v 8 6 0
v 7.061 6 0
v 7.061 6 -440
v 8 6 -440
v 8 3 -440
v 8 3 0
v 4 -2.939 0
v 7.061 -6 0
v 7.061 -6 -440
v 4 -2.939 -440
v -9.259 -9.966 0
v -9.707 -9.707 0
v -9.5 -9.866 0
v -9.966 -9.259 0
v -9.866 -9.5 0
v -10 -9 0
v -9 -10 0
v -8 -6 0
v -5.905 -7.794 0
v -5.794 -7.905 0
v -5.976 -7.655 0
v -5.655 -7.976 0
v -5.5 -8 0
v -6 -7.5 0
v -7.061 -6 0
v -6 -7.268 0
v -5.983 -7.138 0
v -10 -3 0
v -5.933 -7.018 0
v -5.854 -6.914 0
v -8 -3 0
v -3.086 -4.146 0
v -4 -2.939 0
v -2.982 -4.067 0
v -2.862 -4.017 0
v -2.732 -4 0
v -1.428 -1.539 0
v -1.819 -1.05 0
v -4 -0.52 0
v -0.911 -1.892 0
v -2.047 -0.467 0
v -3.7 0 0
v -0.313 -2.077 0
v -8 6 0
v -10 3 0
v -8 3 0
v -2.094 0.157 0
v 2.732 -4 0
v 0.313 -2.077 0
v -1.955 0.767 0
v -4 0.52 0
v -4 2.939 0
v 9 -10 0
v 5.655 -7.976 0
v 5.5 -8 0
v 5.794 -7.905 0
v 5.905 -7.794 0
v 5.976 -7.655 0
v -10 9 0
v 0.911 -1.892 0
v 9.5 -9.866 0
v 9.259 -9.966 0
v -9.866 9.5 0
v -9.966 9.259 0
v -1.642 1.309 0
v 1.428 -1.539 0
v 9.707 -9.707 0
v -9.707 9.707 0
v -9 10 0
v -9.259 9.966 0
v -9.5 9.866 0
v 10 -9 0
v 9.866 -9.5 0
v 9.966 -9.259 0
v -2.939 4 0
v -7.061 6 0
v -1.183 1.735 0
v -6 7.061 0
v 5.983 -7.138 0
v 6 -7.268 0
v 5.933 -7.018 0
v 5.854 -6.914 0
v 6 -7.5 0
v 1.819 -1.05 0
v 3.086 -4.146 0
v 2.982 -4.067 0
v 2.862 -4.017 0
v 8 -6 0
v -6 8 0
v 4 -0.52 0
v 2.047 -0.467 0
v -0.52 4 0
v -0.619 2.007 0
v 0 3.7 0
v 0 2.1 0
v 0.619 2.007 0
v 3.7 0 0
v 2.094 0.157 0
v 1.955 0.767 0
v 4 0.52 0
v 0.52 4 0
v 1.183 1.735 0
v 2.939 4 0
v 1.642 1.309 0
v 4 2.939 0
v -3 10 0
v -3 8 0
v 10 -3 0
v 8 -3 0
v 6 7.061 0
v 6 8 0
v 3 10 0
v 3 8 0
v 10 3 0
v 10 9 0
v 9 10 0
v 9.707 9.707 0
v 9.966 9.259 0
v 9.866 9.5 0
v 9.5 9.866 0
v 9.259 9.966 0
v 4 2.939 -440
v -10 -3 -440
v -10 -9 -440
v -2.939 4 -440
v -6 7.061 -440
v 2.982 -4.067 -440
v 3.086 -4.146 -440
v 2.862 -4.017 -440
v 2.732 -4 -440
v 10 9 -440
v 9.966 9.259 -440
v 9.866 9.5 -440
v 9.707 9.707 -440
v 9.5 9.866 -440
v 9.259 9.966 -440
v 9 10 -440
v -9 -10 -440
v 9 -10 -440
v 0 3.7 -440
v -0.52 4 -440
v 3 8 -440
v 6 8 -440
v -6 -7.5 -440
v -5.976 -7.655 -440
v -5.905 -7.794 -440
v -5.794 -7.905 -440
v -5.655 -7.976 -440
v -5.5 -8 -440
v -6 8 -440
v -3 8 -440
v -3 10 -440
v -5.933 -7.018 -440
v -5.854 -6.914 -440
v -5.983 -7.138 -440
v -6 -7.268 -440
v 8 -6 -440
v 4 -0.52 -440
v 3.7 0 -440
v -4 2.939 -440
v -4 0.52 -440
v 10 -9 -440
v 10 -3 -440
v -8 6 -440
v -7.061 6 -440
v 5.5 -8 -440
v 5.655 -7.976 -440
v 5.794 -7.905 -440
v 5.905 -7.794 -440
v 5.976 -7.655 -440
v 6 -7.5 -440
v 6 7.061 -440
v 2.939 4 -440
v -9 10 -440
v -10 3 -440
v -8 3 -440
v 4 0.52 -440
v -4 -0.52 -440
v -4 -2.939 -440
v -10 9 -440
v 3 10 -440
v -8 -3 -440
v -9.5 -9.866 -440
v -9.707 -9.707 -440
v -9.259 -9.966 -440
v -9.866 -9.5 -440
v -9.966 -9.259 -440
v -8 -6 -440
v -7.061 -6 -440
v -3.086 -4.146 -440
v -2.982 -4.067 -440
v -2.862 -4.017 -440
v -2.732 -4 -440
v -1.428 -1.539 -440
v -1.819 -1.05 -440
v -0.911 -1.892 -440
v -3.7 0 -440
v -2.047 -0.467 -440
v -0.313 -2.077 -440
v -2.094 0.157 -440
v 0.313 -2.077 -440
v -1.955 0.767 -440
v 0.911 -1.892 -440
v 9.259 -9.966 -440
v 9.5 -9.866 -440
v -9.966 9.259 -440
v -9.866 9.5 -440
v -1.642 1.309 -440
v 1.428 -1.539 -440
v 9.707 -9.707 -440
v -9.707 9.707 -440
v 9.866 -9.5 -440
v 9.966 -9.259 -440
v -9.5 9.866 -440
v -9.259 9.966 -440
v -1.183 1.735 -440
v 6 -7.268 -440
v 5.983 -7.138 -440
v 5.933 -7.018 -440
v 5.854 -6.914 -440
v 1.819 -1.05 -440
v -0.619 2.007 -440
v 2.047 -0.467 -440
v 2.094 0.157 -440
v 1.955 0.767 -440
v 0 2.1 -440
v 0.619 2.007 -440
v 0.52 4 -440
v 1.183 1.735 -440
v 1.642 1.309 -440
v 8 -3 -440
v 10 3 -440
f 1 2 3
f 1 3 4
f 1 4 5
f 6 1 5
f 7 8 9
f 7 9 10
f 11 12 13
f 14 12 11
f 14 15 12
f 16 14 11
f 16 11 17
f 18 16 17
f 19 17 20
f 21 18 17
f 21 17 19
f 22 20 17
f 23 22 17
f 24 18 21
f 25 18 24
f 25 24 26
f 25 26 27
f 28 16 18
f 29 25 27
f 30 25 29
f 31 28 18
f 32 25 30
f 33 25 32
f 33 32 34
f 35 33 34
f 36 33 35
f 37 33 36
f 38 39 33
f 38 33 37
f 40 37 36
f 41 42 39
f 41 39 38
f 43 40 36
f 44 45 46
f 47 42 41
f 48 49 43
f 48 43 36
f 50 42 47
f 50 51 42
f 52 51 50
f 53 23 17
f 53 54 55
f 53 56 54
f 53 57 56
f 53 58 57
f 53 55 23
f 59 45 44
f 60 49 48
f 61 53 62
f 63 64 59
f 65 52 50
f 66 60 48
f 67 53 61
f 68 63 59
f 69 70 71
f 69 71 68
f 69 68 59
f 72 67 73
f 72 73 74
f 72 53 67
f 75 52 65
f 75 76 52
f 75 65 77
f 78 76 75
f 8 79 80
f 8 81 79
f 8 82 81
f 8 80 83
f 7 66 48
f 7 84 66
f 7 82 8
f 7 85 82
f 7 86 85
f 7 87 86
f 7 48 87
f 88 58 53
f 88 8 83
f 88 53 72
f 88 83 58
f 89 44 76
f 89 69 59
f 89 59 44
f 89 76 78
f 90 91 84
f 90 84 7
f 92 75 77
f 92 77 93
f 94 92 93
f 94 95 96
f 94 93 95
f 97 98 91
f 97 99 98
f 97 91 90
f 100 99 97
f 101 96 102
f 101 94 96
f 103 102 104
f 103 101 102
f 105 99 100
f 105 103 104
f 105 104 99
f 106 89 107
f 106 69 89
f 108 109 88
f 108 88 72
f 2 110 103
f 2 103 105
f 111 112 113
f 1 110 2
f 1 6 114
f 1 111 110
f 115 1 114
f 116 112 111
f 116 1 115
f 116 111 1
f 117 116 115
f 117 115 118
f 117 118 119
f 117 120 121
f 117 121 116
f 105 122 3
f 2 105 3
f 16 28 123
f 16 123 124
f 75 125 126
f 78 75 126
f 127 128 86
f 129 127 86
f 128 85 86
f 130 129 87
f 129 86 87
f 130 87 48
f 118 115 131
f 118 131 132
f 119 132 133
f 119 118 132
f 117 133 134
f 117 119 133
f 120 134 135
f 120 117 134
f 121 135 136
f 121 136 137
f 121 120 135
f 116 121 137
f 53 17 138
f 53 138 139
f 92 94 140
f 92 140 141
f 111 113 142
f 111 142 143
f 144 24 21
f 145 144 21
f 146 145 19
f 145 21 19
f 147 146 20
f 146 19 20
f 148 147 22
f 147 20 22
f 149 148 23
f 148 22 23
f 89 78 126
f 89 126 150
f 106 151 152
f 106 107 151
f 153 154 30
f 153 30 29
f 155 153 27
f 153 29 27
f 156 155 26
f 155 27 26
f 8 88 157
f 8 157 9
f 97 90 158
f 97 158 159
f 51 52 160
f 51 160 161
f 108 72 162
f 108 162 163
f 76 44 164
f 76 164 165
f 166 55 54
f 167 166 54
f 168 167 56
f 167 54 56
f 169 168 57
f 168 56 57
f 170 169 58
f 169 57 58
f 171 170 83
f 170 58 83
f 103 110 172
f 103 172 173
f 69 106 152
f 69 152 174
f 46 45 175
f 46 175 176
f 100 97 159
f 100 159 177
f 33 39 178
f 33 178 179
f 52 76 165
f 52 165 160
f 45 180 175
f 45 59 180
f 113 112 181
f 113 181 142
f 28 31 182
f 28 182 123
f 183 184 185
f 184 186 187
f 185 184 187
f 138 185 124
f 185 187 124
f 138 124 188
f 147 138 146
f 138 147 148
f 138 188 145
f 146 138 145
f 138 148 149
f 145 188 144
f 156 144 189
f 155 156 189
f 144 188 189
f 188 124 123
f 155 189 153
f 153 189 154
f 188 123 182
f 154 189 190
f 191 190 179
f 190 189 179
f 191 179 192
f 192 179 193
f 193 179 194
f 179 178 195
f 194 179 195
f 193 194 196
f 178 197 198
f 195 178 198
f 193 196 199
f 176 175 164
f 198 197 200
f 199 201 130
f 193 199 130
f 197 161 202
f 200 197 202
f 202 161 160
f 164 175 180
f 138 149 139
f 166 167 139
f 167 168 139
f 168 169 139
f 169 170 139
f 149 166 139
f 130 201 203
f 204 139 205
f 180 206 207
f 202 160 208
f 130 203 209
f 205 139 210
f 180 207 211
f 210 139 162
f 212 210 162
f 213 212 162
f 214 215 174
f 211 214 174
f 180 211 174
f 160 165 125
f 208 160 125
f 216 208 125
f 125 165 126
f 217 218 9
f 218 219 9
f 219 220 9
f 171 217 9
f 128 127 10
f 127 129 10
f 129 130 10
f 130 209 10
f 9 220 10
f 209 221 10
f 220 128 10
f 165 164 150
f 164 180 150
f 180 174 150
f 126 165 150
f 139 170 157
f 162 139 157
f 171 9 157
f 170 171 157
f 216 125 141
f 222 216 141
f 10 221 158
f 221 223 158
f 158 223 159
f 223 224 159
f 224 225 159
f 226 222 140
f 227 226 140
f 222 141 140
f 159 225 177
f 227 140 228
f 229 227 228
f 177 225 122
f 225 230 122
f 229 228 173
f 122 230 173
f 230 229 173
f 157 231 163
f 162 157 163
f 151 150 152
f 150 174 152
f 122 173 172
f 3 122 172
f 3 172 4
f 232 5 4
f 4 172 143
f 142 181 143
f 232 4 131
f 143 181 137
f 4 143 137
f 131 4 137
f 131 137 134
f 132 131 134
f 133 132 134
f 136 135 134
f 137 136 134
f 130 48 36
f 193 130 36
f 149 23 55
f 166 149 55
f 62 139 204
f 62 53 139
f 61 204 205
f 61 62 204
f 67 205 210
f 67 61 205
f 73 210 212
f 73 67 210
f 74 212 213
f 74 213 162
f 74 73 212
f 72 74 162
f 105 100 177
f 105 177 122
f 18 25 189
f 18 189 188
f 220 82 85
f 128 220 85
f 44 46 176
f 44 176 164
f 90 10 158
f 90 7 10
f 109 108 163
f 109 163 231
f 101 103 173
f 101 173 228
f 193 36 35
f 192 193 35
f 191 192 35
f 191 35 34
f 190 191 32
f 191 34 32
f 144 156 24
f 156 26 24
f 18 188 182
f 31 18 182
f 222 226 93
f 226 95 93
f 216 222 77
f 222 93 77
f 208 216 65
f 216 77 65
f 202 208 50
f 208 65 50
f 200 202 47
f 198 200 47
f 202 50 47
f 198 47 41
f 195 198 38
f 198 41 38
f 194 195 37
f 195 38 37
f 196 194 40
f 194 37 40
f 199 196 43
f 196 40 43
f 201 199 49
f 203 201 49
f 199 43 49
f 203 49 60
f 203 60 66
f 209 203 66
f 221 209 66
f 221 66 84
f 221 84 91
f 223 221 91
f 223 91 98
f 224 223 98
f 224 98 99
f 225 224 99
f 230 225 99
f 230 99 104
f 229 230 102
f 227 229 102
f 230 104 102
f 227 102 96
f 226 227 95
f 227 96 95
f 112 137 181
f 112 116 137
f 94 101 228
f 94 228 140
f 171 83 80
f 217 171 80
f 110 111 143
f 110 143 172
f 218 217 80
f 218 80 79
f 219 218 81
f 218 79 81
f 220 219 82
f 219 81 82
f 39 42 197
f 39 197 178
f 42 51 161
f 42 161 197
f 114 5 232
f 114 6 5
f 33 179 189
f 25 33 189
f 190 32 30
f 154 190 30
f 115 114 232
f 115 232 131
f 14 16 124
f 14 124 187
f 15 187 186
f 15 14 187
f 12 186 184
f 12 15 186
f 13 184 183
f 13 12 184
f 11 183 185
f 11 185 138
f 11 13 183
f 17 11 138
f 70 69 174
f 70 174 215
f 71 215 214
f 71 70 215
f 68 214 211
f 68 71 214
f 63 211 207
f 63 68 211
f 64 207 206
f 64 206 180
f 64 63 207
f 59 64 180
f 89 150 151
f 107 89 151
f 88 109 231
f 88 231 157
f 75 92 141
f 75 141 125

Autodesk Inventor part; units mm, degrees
sketch "Sketch_63" plane through (0, 0, 0) normal (0, 0, 1) x (1, 0, 0)
  line L0 (-10, -3) -> (-10, -9)
  arc A0 (-10, -9) -> (-9, -10) centre (-9, -9) ccw
  line L1 (-9, -10) -> (9, -10)
  arc A1 (9, -10) -> (10, -9) centre (9, -9) ccw
  line L2 (10, -9) -> (10, -3)
  line L3 (10, -3) -> (8, -3)
  line L4 (8, -3) -> (8, -6)
  line L5 (8, -6) -> (7.0607, -6)
  line L6 (7.0607, -6) -> (4, -2.9393)
  line L7 (4, -2.9393) -> (4, -0.5196)
  line L8 (4, -0.5196) -> (3.7, 0)
  line L9 (3.7, 0) -> (4, 0.5196)
  line L10 (4, 0.5196) -> (4, 2.9393)
  line L11 (4, 2.9393) -> (7.0607, 6)
  line L12 (7.0607, 6) -> (8, 6)
  line L13 (8, 6) -> (8, 3)
  line L14 (8, 3) -> (10, 3)
  line L15 (10, 3) -> (10, 9)
  arc A2 (10, 9) -> (9, 10) centre (9, 9) ccw
  line L16 (9, 10) -> (3, 10)
  line L17 (3, 10) -> (3, 8)
  line L18 (3, 8) -> (6, 8)
  line L19 (6, 8) -> (6, 7.0607)
  line L20 (6, 7.0607) -> (2.9393, 4)
  line L21 (2.9393, 4) -> (0.5196, 4)
  line L22 (0.5196, 4) -> (0, 3.7)
  line L23 (0, 3.7) -> (-0.5196, 4)
  line L24 (-0.5196, 4) -> (-2.9393, 4)
  line L25 (-2.9393, 4) -> (-6, 7.0607)
  line L26 (-6, 7.0607) -> (-6, 8)
  line L27 (-6, 8) -> (-3, 8)
  line L28 (-3, 8) -> (-3, 10)
  line L29 (-3, 10) -> (-9, 10)
  arc A3 (-9, 10) -> (-10, 9) centre (-9, 9) ccw
  line L30 (-10, 9) -> (-10, 3)
  line L31 (-10, 3) -> (-8, 3)
  line L32 (-8, 3) -> (-8, 6)
  line L33 (-8, 6) -> (-7.0607, 6)
  line L34 (-7.0607, 6) -> (-4, 2.9393)
  line L35 (-4, 2.9393) -> (-4, 0.5196)
  line L36 (-4, 0.5196) -> (-3.7, 0)
  line L37 (-3.7, 0) -> (-4, -0.5196)
  line L38 (-4, -0.5196) -> (-4, -2.9393)
  line L39 (-4, -2.9393) -> (-7.0607, -6)
  line L40 (-7.0607, -6) -> (-8, -6)
  line L41 (-8, -6) -> (-8, -3)
  line L42 (-8, -3) -> (-10, -3)
  line L43 (-6, -7.2678) -> (-6, -7.5)
  arc A4 (-6, -7.5) -> (-5.5, -8) centre (-5.5, -7.5) ccw
  line L44 (-5.5, -8) -> (5.5, -8)
  arc A5 (5.5, -8) -> (6, -7.5) centre (5.5, -7.5) ccw
  line L45 (6, -7.5) -> (6, -7.2678)
  arc A6 (6, -7.2678) -> (5.8536, -6.9142) centre (5.5, -7.2678) ccw
  line L46 (5.8536, -6.9142) -> (3.0858, -4.1464)
  arc A7 (3.0858, -4.1464) -> (2.7322, -4) centre (2.7322, -4.5) ccw
  line L47 (2.7322, -4) -> (-2.7322, -4)
  arc A8 (-2.7322, -4) -> (-3.0858, -4.1464) centre (-2.7322, -4.5) ccw
  line L48 (-3.0858, -4.1464) -> (-5.8536, -6.9142)
  arc A9 (-5.8536, -6.9142) -> (-6, -7.2678) centre (-5.5, -7.2678) ccw
extrude "Extrusion1" add sketch "Sketch_63" against normal blind 440
sketch "Sketch2" plane through (0, 0, -440) normal (0, 0, -1) x (-1, 0, 0)
  point P0 (0, 0)
hole "Hole1" at (0, 0, -440) direction (0, 0, 1) diameter 4.2 depth 440
ref_plane "C1_XY" through (0, 0, 0) normal (0, 0, 1) x (1, 0, 0)
ref_plane "C1_YZ" through (0, 0, 0) normal (1, 0, 0) x (0, 1, 0)
ref_plane "C1_ZX" through (0, 0, 0) normal (0, 1, 0) x (0, 0, 1)
thread "Thread1" size "M5x0.8" class "6H" standard "ANSI Metric M Profile" length 10
thread "Thread2" size "M5x0.8" class "6H" standard "ANSI Metric M Profile" length 10
properties part number "HFSFB5-2020-440" material "Aluminum 6061"
